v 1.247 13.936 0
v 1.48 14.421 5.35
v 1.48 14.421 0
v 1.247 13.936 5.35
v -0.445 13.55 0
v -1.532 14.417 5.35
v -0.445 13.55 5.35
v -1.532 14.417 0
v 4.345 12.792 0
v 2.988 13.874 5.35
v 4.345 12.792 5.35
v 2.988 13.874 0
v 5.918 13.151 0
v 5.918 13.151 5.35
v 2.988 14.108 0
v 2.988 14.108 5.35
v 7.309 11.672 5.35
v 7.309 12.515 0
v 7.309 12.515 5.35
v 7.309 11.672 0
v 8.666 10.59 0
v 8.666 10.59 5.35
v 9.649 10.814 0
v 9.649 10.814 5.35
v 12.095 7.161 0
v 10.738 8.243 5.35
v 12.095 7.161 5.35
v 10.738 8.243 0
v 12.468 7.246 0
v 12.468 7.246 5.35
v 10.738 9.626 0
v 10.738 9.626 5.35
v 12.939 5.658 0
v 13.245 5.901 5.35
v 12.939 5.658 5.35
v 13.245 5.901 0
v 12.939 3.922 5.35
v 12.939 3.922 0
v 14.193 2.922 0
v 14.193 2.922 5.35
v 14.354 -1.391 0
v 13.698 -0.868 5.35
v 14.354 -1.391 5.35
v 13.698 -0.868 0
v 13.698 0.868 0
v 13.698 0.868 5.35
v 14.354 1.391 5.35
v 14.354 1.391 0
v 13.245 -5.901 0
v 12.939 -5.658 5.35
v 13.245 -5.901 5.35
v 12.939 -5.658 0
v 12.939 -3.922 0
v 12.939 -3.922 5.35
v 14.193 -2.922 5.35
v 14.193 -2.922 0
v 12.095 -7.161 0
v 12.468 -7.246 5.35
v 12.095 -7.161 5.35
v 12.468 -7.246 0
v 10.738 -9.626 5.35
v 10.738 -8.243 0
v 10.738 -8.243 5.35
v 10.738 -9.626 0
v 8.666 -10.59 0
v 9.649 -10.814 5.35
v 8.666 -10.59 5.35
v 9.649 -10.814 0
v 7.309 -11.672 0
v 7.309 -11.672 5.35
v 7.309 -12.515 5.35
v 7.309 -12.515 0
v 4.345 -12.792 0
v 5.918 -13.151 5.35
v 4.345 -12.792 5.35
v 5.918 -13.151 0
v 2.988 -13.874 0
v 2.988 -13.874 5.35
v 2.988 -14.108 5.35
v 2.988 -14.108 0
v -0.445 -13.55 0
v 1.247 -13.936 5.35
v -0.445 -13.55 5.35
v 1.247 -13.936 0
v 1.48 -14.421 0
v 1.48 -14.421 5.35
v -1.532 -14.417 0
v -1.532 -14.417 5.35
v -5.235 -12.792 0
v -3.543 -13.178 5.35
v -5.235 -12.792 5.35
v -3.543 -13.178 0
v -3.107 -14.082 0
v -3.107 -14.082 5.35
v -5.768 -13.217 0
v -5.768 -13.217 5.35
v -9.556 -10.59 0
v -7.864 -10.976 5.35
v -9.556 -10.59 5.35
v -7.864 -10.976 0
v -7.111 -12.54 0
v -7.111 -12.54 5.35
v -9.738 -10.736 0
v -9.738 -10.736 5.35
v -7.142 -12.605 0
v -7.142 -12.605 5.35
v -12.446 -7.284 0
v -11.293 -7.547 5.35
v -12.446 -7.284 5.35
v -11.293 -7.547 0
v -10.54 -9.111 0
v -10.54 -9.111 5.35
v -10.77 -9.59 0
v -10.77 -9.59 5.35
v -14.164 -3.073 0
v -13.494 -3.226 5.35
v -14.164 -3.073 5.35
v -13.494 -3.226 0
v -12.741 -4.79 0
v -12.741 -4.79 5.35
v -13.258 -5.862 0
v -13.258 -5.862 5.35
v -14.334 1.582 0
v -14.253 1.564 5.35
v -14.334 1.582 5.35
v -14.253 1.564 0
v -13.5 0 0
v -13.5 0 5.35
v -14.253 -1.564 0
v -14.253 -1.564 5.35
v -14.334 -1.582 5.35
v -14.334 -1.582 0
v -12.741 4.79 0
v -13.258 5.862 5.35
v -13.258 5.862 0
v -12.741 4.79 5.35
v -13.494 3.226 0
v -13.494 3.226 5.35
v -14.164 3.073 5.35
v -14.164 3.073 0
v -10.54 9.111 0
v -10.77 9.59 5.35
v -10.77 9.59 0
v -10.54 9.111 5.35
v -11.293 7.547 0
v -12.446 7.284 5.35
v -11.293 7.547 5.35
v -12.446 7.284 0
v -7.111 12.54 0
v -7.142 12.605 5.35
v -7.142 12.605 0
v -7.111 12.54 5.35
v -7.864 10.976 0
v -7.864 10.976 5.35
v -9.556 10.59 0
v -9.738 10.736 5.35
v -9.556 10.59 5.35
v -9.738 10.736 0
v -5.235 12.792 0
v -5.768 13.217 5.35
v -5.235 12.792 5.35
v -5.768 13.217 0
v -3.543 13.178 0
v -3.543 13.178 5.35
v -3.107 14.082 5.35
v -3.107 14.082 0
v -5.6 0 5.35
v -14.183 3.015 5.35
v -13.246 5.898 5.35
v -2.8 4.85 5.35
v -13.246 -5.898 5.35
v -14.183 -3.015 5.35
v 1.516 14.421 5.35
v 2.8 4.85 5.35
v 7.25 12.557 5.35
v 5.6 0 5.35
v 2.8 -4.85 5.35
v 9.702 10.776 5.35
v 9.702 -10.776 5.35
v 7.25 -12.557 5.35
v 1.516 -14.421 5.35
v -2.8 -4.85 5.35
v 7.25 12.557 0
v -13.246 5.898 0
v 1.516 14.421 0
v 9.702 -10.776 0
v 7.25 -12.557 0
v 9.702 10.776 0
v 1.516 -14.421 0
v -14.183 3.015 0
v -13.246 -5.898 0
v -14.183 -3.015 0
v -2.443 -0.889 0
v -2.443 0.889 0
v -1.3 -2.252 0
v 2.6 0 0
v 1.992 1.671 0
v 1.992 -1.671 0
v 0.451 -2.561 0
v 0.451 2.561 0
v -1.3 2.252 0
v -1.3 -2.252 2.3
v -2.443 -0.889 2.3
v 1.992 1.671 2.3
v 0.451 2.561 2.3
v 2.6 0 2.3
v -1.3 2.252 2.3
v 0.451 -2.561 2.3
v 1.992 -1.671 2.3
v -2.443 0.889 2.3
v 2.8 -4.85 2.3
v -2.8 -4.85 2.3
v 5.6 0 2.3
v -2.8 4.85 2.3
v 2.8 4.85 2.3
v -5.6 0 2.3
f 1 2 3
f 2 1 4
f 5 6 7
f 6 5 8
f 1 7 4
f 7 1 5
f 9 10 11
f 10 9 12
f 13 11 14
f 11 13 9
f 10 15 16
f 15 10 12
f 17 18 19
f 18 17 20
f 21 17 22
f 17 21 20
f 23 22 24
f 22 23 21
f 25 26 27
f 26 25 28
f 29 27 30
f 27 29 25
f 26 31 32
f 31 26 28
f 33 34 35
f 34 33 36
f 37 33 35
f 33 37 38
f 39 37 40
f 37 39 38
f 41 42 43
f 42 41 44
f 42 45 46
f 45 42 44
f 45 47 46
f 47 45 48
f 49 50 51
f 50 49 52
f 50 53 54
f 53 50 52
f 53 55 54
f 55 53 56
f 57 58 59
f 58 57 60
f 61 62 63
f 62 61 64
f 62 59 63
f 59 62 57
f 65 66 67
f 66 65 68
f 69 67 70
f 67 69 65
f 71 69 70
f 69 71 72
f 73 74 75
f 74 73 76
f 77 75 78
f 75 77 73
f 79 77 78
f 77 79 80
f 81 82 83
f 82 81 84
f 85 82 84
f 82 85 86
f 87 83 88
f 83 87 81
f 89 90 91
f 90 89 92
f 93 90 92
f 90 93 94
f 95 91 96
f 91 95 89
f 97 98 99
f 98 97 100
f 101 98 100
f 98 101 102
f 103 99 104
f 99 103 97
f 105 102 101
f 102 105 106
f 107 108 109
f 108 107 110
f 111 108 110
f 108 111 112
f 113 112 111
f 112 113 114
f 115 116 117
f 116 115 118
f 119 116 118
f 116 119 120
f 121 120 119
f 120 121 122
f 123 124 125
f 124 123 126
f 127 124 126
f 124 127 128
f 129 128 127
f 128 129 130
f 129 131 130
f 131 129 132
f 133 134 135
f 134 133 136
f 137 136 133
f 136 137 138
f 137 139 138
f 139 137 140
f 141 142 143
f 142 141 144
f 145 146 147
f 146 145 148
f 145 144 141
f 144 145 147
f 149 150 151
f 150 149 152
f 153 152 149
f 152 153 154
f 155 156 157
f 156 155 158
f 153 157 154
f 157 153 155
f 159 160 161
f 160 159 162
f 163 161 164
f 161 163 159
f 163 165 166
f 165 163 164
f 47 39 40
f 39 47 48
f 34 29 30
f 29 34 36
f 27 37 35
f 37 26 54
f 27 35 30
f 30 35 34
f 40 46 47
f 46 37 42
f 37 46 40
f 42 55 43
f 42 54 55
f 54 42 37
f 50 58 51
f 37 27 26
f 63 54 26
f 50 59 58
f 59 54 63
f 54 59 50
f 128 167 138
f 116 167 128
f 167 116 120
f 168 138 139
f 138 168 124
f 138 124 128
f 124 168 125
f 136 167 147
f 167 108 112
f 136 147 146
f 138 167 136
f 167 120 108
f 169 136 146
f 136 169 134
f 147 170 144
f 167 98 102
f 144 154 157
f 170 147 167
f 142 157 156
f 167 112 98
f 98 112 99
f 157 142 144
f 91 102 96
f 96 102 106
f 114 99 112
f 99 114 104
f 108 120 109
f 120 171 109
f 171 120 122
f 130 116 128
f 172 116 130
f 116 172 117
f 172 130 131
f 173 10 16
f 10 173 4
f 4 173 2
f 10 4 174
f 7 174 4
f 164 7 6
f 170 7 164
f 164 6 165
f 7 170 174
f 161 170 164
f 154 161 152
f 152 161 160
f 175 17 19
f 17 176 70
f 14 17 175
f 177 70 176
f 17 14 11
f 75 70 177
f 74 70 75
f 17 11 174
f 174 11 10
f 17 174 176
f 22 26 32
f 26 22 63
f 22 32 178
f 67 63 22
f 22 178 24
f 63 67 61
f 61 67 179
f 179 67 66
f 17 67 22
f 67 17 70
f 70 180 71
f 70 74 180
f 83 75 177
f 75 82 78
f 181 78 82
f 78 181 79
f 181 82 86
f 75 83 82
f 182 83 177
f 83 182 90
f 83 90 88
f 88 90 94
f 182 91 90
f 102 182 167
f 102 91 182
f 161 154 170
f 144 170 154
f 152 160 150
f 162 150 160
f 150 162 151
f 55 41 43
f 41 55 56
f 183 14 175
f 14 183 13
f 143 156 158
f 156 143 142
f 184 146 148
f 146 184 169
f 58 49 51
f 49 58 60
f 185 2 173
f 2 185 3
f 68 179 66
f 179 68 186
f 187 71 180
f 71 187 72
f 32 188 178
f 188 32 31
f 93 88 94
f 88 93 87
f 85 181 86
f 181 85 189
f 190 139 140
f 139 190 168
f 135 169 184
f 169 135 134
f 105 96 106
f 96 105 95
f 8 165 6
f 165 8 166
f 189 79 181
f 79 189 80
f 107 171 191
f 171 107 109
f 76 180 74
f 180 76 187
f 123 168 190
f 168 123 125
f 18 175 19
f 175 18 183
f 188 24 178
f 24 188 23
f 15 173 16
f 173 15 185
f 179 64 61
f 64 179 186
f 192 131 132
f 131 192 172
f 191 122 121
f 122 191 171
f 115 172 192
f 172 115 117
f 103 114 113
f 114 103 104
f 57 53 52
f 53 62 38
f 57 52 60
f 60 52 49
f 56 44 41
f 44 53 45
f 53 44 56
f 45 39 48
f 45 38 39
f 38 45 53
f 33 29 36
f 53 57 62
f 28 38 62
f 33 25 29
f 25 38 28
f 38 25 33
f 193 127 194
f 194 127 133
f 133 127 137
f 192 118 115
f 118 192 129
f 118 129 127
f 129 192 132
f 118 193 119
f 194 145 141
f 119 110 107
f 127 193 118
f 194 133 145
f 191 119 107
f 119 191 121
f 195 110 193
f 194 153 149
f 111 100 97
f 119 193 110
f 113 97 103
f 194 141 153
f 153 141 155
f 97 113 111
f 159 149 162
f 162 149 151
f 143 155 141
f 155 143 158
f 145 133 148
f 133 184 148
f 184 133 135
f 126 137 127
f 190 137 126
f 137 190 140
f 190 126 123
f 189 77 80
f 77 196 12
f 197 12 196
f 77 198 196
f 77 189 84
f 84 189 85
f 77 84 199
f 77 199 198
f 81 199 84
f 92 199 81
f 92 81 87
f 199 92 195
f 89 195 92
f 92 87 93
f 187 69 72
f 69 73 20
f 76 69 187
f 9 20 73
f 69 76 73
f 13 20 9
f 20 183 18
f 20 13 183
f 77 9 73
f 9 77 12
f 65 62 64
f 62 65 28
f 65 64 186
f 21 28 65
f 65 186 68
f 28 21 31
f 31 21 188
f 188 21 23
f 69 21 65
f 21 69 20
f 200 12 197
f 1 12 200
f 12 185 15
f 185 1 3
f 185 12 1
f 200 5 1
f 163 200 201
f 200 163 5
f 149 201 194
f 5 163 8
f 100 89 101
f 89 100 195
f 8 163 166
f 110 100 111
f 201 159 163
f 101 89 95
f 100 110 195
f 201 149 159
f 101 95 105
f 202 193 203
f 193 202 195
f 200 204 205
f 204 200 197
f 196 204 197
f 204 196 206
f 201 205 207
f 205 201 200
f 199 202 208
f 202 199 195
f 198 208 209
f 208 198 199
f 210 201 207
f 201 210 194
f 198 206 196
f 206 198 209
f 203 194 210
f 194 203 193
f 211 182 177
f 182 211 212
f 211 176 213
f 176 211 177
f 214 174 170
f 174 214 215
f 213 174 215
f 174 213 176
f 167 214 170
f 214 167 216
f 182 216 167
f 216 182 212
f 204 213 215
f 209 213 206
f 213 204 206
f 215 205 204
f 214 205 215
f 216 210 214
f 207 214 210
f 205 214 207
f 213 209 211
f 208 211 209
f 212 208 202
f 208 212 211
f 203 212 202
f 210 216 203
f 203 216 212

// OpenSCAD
/*

Parametric knob generator
by Gian Pablo Villamil
May 2011

Makes knurled knobs that accomodate a nut in the middle, useful for things
like camera mounts.

*/

knob_radius = 14.5;
dent_radius = 2;
knob_height = 5.35;
num_dents = 20;
dent_offset = 1;

nut_hole_radius = 2.6; // half of 1/4 inch in millimeters
nut_size_radius =5.6; // point to point size of nut

module knob()
{
	translate([0, 0, 0]) {
		difference() {
		cylinder(h = knob_height, r = knob_radius);
		for (i = [0:(num_dents - 1)]) {
			translate([sin(360*i/num_dents)*(knob_radius+dent_offset), cos(360*i/num_dents)*(knob_radius+dent_offset), -5 ])
			cylinder(h = knob_height+10, r=dent_radius);
			}
		translate([0,0,-5]) cylinder(h = knob_height+10, r=nut_hole_radius,$fa=10);
		translate([0,0,2.3]) cylinder(h = knob_height+10, r=nut_size_radius,$fa=60);
		}
	}
}

knob();
